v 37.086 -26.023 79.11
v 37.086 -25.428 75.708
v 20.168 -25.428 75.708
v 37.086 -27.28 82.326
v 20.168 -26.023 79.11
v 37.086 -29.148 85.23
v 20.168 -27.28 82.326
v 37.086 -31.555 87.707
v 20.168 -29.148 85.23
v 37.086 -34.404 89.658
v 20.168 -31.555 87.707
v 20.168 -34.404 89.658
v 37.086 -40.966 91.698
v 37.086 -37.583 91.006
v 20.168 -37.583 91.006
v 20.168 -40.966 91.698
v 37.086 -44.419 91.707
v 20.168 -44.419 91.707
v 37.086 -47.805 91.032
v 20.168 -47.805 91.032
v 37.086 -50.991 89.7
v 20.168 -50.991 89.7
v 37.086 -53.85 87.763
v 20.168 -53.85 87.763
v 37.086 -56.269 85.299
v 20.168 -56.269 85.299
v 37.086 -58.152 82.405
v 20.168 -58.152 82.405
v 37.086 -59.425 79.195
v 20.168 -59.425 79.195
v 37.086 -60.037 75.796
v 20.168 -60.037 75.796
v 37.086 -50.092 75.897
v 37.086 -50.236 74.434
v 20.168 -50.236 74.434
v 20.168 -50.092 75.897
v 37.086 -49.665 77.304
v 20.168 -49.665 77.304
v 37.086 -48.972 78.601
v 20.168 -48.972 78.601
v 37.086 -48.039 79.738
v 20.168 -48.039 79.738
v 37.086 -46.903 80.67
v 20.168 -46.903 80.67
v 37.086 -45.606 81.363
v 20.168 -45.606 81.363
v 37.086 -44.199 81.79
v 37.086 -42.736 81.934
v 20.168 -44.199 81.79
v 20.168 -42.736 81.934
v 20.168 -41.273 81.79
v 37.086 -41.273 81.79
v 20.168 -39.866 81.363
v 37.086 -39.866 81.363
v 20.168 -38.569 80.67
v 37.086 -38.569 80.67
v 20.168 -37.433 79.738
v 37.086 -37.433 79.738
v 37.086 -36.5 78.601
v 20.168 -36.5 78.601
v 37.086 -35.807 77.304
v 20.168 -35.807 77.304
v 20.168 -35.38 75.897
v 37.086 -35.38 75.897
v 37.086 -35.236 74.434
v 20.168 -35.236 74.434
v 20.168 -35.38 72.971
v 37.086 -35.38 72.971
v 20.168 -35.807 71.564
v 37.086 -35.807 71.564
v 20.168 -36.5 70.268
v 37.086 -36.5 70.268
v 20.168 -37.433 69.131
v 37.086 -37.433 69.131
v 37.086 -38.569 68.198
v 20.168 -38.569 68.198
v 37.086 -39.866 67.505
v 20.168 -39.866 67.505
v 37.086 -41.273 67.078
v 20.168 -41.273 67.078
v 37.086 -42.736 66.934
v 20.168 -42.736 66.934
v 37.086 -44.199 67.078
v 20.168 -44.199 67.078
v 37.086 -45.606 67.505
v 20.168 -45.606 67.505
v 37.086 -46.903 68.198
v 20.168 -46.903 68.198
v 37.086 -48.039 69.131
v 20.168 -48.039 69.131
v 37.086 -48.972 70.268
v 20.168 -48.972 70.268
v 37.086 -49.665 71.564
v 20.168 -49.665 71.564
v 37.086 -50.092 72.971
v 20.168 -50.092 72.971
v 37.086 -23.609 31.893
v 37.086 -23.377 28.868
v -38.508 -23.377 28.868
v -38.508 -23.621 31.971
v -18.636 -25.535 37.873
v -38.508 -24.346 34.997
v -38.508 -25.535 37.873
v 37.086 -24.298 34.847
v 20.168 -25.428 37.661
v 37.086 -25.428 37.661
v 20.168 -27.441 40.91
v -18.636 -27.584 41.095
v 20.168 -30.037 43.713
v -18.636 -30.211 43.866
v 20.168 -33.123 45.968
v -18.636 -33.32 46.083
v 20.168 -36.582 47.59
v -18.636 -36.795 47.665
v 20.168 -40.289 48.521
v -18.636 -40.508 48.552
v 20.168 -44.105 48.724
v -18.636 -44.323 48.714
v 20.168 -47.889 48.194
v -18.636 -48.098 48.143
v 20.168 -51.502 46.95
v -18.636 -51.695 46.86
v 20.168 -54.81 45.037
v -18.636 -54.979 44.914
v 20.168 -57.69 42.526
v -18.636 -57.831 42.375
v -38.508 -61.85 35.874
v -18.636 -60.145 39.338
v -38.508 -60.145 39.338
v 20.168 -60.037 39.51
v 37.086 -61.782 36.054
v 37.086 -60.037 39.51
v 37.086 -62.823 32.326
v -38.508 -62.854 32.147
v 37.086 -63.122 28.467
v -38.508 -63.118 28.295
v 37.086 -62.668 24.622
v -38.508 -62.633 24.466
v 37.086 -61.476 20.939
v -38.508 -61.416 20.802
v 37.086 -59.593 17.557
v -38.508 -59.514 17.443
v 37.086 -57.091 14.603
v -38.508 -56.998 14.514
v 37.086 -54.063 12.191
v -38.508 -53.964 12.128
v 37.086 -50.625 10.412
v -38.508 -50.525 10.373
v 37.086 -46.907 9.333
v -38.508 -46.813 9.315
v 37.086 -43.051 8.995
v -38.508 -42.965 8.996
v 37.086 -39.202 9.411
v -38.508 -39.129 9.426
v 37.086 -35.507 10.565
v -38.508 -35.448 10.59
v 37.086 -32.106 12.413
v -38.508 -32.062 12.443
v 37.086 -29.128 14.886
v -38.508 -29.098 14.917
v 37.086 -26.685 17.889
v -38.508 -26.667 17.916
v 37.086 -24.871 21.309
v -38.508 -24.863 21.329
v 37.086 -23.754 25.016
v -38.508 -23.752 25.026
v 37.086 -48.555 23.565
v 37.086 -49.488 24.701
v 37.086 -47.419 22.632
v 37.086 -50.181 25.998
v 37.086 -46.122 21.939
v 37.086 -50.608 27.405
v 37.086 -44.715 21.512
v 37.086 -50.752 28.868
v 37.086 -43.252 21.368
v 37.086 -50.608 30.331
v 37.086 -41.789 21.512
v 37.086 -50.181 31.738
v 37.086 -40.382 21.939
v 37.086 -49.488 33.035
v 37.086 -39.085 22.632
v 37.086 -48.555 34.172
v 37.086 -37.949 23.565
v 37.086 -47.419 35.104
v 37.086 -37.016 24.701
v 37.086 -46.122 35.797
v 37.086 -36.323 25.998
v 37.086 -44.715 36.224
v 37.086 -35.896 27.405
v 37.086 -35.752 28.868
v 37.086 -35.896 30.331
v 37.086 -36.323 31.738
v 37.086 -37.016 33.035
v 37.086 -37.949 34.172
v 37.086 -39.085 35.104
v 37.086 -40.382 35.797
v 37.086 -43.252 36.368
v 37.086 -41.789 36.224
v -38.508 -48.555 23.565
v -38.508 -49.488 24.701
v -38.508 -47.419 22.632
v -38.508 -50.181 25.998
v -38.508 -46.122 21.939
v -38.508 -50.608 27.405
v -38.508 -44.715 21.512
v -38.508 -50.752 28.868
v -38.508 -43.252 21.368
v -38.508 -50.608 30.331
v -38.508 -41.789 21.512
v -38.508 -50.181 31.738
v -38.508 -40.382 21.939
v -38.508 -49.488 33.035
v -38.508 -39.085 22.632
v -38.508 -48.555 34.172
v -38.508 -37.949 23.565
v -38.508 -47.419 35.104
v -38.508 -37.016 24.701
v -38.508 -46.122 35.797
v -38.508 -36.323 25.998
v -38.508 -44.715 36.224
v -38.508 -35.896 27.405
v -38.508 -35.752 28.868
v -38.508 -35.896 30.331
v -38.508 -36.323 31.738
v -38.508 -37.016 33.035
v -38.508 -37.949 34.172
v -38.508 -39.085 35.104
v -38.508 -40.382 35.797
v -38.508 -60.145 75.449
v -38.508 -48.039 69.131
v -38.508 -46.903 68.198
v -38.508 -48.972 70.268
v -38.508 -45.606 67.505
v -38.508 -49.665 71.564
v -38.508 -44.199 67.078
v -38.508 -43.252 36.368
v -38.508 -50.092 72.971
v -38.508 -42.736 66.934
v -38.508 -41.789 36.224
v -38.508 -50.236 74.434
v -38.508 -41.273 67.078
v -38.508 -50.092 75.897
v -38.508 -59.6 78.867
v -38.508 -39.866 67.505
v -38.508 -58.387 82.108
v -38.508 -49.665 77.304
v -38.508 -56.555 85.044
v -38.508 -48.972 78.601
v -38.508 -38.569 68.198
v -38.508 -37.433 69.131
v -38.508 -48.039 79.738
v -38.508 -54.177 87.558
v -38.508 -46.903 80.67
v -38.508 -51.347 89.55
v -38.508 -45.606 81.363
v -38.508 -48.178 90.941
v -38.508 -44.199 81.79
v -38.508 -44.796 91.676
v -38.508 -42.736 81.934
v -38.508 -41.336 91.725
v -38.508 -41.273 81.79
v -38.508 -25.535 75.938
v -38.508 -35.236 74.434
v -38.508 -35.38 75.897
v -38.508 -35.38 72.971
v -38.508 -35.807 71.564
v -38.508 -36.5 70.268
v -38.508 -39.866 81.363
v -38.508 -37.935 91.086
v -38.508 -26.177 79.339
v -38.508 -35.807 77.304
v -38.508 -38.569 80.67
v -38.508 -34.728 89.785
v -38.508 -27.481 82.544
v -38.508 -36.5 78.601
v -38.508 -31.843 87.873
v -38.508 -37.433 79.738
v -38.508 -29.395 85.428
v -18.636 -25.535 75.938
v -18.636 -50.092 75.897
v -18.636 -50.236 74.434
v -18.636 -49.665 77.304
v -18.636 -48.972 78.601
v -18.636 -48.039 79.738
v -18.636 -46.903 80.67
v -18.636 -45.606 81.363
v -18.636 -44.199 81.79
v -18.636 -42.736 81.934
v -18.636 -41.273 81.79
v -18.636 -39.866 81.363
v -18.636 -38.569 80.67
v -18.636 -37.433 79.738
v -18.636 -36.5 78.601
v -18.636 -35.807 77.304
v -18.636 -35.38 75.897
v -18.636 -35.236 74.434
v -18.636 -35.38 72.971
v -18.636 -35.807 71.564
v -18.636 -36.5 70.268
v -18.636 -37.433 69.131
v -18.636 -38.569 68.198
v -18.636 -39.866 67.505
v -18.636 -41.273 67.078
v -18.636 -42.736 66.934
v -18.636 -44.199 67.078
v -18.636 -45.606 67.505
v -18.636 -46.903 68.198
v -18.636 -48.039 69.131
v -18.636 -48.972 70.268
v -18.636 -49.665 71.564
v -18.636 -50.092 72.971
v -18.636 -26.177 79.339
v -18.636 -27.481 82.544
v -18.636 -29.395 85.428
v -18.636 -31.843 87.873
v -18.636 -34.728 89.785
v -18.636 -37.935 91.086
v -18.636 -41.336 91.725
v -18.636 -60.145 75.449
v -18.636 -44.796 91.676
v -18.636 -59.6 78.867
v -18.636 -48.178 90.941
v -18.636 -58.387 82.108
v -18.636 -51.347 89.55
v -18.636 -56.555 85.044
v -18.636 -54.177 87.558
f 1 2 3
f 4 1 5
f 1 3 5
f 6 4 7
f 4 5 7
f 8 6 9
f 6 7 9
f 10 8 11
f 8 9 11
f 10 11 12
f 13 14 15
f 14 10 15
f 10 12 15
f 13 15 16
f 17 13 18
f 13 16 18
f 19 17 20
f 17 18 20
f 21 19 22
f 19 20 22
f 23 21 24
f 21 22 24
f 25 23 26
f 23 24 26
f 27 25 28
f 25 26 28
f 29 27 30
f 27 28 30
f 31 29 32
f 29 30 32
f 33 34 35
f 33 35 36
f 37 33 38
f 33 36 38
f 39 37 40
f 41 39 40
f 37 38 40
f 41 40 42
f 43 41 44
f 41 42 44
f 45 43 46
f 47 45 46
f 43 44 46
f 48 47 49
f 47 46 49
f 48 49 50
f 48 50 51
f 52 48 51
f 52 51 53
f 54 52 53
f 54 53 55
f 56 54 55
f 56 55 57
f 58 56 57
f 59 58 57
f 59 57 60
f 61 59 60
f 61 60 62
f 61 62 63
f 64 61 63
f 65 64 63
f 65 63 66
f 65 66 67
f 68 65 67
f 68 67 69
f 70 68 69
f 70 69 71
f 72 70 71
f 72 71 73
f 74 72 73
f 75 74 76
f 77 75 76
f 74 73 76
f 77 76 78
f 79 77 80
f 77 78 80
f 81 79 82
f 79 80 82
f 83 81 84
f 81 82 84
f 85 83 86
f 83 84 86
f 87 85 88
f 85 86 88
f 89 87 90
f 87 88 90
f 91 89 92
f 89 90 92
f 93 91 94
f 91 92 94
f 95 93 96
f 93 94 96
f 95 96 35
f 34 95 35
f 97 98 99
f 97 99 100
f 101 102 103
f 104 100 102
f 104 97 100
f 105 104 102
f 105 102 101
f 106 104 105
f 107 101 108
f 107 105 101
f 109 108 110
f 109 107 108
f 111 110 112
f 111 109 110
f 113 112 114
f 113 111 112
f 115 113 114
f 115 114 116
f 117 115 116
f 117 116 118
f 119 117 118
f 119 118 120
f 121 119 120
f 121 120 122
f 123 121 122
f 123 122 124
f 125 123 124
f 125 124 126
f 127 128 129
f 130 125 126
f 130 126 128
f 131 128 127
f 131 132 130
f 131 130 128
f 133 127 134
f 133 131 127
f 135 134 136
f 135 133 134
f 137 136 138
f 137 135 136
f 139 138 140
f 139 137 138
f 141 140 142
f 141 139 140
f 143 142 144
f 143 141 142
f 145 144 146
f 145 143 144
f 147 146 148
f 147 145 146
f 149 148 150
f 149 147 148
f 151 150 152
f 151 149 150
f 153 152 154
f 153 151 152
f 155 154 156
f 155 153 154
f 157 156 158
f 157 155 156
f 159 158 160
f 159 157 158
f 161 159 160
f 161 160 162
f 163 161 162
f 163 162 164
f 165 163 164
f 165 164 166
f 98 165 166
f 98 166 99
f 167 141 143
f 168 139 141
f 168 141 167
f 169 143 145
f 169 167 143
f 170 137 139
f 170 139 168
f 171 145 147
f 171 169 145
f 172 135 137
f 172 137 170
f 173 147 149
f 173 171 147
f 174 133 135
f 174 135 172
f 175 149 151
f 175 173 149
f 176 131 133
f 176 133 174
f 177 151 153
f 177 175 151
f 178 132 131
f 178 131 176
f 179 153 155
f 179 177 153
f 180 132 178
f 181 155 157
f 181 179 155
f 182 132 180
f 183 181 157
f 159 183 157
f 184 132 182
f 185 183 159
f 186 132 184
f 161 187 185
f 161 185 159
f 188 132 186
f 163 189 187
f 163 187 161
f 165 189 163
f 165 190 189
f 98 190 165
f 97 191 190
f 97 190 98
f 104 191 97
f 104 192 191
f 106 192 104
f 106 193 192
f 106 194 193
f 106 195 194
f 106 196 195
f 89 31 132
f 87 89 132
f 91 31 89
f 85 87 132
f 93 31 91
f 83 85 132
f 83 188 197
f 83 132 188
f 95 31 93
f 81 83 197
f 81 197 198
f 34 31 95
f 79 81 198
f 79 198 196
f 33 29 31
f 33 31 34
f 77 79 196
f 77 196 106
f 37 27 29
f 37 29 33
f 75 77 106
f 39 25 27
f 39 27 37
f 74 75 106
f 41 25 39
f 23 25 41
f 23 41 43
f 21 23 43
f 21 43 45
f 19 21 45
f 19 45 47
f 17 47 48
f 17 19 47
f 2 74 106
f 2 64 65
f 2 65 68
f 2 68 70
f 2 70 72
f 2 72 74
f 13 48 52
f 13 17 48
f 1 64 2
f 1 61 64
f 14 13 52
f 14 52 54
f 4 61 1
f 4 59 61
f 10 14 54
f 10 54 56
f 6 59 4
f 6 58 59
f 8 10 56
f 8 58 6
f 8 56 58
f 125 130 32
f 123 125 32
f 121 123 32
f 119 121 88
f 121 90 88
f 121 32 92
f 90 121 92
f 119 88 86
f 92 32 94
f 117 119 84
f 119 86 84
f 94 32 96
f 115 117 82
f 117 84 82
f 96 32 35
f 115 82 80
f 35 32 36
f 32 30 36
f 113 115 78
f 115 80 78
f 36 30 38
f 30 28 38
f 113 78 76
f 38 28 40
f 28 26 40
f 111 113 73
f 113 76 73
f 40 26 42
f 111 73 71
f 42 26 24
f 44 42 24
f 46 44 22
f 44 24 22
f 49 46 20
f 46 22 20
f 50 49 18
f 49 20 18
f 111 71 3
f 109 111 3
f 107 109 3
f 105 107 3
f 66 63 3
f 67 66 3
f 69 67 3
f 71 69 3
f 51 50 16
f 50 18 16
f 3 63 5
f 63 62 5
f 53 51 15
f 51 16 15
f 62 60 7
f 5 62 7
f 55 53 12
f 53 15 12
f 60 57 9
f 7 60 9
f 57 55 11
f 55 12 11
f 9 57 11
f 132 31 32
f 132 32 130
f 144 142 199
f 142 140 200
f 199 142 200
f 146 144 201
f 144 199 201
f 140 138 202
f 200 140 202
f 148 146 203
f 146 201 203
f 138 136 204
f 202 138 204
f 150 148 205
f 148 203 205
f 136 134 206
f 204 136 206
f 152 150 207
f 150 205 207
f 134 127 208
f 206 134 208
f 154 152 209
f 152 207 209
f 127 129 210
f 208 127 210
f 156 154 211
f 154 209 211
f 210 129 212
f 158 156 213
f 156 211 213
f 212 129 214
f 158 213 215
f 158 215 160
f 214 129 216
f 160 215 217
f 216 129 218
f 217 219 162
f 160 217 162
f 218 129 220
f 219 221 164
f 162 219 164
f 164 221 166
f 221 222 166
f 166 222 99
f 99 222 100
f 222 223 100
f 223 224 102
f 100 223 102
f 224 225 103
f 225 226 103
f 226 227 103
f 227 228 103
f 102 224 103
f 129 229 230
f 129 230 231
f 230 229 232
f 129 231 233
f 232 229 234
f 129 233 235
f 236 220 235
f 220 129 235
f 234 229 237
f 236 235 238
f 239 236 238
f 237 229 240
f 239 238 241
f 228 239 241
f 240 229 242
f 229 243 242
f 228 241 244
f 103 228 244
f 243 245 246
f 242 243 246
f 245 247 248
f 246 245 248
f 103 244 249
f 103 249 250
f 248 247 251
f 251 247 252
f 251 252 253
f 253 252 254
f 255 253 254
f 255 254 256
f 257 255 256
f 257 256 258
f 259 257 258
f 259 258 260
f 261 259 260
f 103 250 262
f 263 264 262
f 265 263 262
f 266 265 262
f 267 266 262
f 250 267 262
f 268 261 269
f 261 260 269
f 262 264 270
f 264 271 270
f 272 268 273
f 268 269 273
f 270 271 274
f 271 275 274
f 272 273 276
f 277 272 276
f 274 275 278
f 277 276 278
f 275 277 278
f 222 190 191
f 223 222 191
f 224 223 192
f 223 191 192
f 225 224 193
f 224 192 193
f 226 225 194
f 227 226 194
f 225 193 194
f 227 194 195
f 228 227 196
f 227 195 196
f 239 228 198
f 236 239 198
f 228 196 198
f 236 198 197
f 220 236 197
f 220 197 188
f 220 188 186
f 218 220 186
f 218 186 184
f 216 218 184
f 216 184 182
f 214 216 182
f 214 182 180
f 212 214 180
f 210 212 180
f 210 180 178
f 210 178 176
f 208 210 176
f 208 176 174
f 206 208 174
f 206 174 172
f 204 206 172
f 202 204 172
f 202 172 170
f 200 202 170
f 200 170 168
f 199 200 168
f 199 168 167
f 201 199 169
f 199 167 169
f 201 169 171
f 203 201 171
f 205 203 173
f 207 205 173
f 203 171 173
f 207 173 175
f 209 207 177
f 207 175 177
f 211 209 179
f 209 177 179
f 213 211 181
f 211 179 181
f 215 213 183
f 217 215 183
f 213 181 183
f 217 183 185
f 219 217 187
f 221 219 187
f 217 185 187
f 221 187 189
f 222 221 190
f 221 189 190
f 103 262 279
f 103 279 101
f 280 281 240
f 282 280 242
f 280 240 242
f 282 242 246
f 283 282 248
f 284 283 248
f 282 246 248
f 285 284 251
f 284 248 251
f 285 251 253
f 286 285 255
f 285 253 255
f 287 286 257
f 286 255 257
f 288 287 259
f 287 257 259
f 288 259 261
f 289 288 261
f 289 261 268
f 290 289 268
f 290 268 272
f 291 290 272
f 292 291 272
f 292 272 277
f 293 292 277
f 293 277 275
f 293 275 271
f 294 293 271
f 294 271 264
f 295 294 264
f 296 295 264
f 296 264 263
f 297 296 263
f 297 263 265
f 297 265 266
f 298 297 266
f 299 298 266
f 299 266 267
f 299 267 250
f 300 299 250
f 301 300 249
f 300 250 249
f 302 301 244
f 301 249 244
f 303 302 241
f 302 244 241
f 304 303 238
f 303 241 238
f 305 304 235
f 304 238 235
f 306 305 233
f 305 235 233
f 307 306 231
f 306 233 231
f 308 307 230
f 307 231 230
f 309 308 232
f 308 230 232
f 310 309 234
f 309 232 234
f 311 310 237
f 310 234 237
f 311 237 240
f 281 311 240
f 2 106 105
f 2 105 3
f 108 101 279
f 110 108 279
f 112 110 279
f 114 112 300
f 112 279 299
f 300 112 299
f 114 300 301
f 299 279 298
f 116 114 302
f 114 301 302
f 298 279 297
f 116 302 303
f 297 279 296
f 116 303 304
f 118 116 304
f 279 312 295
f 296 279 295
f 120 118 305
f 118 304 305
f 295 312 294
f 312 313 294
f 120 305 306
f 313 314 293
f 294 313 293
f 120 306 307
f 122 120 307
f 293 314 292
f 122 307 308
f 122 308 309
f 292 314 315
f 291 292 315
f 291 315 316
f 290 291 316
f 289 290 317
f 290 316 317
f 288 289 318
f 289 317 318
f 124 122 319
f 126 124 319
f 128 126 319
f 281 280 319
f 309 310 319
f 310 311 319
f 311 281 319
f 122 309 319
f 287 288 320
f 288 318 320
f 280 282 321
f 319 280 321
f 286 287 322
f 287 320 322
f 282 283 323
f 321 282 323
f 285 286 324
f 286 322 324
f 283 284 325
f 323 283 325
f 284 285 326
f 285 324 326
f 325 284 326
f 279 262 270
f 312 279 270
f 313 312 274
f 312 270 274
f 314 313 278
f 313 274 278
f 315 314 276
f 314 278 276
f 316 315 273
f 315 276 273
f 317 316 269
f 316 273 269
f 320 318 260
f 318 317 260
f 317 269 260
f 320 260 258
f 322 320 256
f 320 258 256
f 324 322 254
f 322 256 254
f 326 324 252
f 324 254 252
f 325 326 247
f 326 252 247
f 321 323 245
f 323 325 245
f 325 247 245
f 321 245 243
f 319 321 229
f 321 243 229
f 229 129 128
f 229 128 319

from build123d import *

# Parameters (mm, degrees)
F0_R          = 19.8744550468
F1_DEPTH      = 37.0859950781
F1_DEPTH_BACK = 38.5084822774
F3_D          = 15
F6_DEPTH      = 19.8722034693
F7_DEPTH      = 16.9176664203
F9_DEPTH      = 25
F11_DEPTH     = 25
F13_D         = 15


with BuildPart() as f1:
    # F0 (on Right) → F1 (new body, two sides)
    with BuildSketch(Plane.YZ) as f1_sk:
        with Locations((-43.2518944144, 28.8682542741)):
            Circle(F0_R)
    extrude(amount=F1_DEPTH)
    extrude(f1_sk.sketch, amount=-F1_DEPTH_BACK)

    # F3 (through all)
    with Locations(Plane(origin=(-38.5084822774, 0, 0), x_dir=(0, -1, 0), z_dir=(-1, 0, 0))):
        with Locations((43.2518944144, 28.8682542741)):
            Hole(F3_D / 2)

    # F4 (on face) → F6 (join)
    with BuildSketch(Plane(origin=(-38.5084822774, 0, 0), x_dir=(0, -1, 0), z_dir=(-1, 0, 0))):
        with BuildLine():
            Line((25.5346700703, 92.9932743311), (25.5346700703, 37.8734708149))
            ThreePointArc((25.5346700703, 37.8734708149), (42.4117718159, 48.7249447694), (60.1451545954, 39.3378160541))
            Line((60.1451545954, 39.3378160541), (60.1451545954, 92.9932743311))
            Line((60.1451545954, 92.9932743311), (25.5346700703, 92.9932743311))
        make_face()
    extrude(amount=-F6_DEPTH)

    # F5 (on face) → F7 (join)
    with BuildSketch(Plane.YZ.offset(37.0859950781)):
        with BuildLine():
            ThreePointArc((-60.0371137261, 39.51017027), (-42.1917249238, 48.7144126948), (-25.4284662629, 37.6613977583))
            Line((-25.4284662629, 37.6613977583), (-25.4284662629, 92.7953794599))
            Line((-25.4284662629, 92.7953794599), (-60.0371137261, 92.7953794599))
            Line((-60.0371137261, 92.7953794599), (-60.0371137261, 39.51017027))
        make_face()
    extrude(amount=-F7_DEPTH)

    # F8 (on face) → F9 (cut)
    with BuildSketch(Plane(origin=(-38.5084822774, 0, 0), x_dir=(0, -1, 0), z_dir=(-1, 0, 0))):
        with BuildLine():
            ThreePointArc((25.5346700703, 75.9382109612), (43.0672230686, 91.7866784097), (60.1451545954, 75.4493411154))
            Line((60.1451545954, 75.4493411154), (60.1451545954, 92.9932743311))
            Line((60.1451545954, 92.9932743311), (25.5346700703, 92.9932743311))
            Line((25.5346700703, 92.9932743311), (25.5346700703, 75.9382109612))
        make_face()
    extrude(amount=-F9_DEPTH, mode=Mode.SUBTRACT)

    # F10 (on face) → F11 (cut)
    with BuildSketch(Plane(origin=(20.1683286577, 0, 0), x_dir=(0, -1, 0), z_dir=(-1, 0, 0))):
        with BuildLine():
            ThreePointArc((25.4284662629, 75.7083371282), (42.6920558049, 91.7887475509), (60.0371137261, 75.7962465286))
            Line((60.0371137261, 75.7962465286), (60.0371137261, 92.7953794599))
            Line((60.0371137261, 92.7953794599), (25.4284662629, 92.7953794599))
            Line((25.4284662629, 92.7953794599), (25.4284662629, 75.7083371282))
        make_face()
    extrude(amount=-F11_DEPTH, mode=Mode.SUBTRACT)

    # F13 (through all)
    with Locations(Plane.YZ.offset(37.0859950781)):
        with Locations((-42.7361378145, 74.4343039762)):
            Hole(F13_D / 2)


solid = f1.part
